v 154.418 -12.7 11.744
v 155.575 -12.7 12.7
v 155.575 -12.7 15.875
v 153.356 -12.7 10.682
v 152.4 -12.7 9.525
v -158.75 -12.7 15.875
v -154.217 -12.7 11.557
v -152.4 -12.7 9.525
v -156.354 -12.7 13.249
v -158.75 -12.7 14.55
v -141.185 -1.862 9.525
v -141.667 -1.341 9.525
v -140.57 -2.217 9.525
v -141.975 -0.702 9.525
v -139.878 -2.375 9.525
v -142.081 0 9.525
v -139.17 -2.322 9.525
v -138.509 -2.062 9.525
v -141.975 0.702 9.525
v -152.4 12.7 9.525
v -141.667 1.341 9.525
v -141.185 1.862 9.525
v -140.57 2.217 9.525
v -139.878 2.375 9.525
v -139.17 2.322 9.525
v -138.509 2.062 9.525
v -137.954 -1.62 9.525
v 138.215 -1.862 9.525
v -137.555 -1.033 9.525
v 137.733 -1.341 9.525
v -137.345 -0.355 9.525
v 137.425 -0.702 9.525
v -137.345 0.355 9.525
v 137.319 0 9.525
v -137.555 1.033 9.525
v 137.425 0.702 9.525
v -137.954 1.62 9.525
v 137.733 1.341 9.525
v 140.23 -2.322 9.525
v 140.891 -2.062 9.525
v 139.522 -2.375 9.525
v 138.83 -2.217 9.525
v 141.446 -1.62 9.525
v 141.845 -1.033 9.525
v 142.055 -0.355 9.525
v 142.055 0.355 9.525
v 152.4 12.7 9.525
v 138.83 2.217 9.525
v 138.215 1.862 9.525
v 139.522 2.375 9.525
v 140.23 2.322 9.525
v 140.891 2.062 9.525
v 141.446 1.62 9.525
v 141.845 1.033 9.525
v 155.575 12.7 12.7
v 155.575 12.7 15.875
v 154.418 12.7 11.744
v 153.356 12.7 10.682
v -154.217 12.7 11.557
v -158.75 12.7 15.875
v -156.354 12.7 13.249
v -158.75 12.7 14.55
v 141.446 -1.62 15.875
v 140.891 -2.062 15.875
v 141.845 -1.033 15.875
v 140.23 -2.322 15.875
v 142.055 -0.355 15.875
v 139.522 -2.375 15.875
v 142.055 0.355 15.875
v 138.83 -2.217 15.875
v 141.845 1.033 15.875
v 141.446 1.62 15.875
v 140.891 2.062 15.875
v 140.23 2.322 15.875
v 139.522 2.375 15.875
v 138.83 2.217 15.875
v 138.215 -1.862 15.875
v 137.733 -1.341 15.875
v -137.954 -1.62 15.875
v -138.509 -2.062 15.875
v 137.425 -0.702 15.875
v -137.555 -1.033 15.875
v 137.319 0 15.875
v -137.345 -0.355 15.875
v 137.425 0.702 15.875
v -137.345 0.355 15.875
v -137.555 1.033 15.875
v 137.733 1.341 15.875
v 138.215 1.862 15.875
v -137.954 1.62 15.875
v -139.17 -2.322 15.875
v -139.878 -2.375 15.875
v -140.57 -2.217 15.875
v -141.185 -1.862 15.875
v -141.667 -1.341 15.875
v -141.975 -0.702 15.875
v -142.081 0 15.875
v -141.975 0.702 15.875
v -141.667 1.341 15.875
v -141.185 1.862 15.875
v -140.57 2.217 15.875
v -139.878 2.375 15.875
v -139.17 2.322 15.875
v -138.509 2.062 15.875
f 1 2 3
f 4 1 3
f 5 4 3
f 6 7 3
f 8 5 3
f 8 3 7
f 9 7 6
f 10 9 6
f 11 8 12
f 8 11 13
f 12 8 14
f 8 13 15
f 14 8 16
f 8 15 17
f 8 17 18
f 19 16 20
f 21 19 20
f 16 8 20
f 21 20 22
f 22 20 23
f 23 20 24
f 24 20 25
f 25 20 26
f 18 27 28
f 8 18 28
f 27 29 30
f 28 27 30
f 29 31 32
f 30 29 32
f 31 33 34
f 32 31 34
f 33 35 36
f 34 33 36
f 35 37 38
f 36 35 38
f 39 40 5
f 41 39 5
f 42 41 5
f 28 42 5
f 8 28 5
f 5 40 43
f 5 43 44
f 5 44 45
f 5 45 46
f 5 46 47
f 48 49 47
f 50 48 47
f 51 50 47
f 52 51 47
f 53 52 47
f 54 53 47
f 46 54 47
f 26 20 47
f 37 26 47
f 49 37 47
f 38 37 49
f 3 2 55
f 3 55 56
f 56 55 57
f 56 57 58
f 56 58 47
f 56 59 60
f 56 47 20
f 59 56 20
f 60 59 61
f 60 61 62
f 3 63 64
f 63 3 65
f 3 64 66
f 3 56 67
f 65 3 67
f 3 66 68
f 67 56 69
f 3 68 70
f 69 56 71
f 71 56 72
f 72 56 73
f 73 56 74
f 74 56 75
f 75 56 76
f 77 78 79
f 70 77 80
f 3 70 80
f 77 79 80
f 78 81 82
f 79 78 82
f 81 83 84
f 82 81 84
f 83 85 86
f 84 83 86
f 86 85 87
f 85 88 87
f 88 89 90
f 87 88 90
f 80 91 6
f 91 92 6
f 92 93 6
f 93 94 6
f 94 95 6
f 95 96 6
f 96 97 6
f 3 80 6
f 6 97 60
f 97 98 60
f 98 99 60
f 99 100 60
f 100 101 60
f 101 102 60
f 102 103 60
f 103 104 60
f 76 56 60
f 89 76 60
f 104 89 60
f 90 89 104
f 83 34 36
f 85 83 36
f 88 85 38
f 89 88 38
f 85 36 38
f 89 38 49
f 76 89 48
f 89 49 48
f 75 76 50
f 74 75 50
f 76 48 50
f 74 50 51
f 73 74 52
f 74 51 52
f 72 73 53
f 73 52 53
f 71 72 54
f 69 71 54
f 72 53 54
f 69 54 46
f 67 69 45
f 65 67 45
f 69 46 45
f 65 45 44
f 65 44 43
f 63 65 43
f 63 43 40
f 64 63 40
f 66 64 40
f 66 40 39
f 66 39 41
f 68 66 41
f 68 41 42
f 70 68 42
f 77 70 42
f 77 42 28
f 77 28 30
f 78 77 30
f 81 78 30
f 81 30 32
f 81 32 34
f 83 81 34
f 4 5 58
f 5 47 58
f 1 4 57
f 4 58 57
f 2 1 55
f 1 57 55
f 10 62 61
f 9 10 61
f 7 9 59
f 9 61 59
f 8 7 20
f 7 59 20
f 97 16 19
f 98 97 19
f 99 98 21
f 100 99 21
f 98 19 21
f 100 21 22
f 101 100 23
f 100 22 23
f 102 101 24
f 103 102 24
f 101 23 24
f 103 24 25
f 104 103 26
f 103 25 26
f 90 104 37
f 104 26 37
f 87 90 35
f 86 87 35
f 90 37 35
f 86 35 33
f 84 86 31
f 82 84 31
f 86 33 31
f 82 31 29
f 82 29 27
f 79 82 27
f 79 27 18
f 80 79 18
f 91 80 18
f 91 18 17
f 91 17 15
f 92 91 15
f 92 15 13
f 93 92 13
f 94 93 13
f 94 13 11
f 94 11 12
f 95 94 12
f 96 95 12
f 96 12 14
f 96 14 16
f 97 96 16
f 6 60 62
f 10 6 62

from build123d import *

# Parameters (mm, degrees)
BASE_DEPTH                     = 12.7
F_3_16_0_1875_DIAMETER_HOLE1_D = 4.7625


with BuildPart() as part:
    # Sketch1 → Base (new body, symmetric)
    with BuildSketch(Plane(origin=(0, 0, 0), x_dir=(1, 0, 0), z_dir=(0, 1, 0))):
        with BuildLine():
            Line((-152.4, -9.525), (152.4, -9.525))
            ThreePointArc((152.4, -9.525), (153.874679849, -11.225320151), (155.575, -12.7))
            Line((155.575, -12.7), (155.575, -15.875))
            Line((155.575, -15.875), (-158.75, -15.875))
            Line((-158.75, -15.875), (-158.75, -14.549677831))
            ThreePointArc((-158.75, -14.549677831), (-155.249240038, -12.449022177), (-152.4, -9.525))
        make_face()
    extrude(amount=BASE_DEPTH, both=True)

    # 3/16 (0.1875) Diameter Hole1 (through all)
    with Locations(Plane.XY.offset(15.875)):
        with Locations((-139.7, 0), (139.7, 0)):
            Hole(F_3_16_0_1875_DIAMETER_HOLE1_D / 2)


solid = part.part
